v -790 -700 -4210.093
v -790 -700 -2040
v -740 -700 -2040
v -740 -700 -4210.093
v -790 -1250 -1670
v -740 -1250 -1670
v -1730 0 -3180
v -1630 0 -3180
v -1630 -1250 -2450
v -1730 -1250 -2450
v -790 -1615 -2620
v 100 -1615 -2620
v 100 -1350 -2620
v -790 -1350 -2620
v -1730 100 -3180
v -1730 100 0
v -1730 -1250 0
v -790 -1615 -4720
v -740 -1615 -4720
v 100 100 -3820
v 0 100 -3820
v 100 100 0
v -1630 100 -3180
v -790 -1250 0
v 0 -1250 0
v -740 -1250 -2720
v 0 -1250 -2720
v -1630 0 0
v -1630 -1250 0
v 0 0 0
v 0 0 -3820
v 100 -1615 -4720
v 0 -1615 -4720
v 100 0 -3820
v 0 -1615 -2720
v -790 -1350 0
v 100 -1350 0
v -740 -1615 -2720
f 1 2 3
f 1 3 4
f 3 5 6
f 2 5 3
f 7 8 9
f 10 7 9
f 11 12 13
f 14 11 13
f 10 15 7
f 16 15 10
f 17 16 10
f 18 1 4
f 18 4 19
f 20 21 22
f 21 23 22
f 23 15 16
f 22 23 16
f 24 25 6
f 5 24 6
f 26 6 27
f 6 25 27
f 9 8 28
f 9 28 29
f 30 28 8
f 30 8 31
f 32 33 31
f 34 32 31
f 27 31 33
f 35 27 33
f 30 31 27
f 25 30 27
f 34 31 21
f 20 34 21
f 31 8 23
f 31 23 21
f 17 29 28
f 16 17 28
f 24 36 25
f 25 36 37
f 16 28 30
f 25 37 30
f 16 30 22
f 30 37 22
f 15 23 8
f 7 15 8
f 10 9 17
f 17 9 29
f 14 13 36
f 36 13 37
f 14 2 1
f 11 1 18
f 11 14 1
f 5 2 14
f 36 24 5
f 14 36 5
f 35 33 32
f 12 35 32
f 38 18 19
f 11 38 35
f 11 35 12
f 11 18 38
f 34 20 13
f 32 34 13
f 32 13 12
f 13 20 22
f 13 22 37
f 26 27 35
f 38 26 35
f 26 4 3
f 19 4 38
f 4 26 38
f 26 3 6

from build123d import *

# Parameters (mm, degrees)
F1_DEPTH  = 100
F3_DEPTH  = 100
F5_DEPTH  = 100
F7_DEPTH  = 100
F8_DEPTH  = 790
F10_DEPTH = 50


with BuildPart() as f1:
    # F0 (on Front) → F1 (new body)
    with BuildSketch(Plane.XZ):
        Polygon((0, -3820), (0, 0), (-1630, 0), (-1630, -3180), align=None)
    extrude(amount=-F1_DEPTH)

    # F2 (on face) → F3 (join)
    with BuildSketch(Plane(origin=(-1630, 0, 0), x_dir=(0, -1, 0), z_dir=(-1, 0, 0))):
        Polygon((1250, 0), (-100, 0), (-100, -3180), (0, -3180), (1250, -2450), align=None)
    extrude(amount=F3_DEPTH)

    # F4 (on face) → F5 (join)
    with BuildSketch(Plane.YZ):
        Polygon((100, -3820), (100, 0), (-1250, 0), (-1250, -2720), (-1615, -2720), (-1615, -4720), (0, -3820), align=None)
    extrude(amount=F5_DEPTH)

    # F6 (on face) → F7 (join, through all)
    with BuildSketch(Plane(origin=(0, 0, 0), x_dir=(0, -1, 0), z_dir=(-1, 0, 0))):
        Polygon((1350, 0), (1250, 0), (1250, -2720), (1615, -2720), (1615, -2620), (1350, -2620), align=None)
    extrude(amount=-F7_DEPTH)

    # F6 (on face) → F8 (join)
    with BuildSketch(Plane(origin=(0, 0, 0), x_dir=(0, -1, 0), z_dir=(-1, 0, 0))):
        Polygon((1350, 0), (1250, 0), (1250, -2720), (1615, -2720), (1615, -2620), (1350, -2620), align=None)
    extrude(amount=F8_DEPTH)

    # F9 (on face) → F10 (join)
    with BuildSketch(Plane(origin=(-790, 0, 0), x_dir=(0, -1, 0), z_dir=(-1, 0, 0))):
        Polygon((1250, -2720), (1250, -1670), (700, -2040), (700, -4210.092879), (1615, -4720), (1615, -2720), align=None)
    extrude(amount=-F10_DEPTH)


solid = f1.part
